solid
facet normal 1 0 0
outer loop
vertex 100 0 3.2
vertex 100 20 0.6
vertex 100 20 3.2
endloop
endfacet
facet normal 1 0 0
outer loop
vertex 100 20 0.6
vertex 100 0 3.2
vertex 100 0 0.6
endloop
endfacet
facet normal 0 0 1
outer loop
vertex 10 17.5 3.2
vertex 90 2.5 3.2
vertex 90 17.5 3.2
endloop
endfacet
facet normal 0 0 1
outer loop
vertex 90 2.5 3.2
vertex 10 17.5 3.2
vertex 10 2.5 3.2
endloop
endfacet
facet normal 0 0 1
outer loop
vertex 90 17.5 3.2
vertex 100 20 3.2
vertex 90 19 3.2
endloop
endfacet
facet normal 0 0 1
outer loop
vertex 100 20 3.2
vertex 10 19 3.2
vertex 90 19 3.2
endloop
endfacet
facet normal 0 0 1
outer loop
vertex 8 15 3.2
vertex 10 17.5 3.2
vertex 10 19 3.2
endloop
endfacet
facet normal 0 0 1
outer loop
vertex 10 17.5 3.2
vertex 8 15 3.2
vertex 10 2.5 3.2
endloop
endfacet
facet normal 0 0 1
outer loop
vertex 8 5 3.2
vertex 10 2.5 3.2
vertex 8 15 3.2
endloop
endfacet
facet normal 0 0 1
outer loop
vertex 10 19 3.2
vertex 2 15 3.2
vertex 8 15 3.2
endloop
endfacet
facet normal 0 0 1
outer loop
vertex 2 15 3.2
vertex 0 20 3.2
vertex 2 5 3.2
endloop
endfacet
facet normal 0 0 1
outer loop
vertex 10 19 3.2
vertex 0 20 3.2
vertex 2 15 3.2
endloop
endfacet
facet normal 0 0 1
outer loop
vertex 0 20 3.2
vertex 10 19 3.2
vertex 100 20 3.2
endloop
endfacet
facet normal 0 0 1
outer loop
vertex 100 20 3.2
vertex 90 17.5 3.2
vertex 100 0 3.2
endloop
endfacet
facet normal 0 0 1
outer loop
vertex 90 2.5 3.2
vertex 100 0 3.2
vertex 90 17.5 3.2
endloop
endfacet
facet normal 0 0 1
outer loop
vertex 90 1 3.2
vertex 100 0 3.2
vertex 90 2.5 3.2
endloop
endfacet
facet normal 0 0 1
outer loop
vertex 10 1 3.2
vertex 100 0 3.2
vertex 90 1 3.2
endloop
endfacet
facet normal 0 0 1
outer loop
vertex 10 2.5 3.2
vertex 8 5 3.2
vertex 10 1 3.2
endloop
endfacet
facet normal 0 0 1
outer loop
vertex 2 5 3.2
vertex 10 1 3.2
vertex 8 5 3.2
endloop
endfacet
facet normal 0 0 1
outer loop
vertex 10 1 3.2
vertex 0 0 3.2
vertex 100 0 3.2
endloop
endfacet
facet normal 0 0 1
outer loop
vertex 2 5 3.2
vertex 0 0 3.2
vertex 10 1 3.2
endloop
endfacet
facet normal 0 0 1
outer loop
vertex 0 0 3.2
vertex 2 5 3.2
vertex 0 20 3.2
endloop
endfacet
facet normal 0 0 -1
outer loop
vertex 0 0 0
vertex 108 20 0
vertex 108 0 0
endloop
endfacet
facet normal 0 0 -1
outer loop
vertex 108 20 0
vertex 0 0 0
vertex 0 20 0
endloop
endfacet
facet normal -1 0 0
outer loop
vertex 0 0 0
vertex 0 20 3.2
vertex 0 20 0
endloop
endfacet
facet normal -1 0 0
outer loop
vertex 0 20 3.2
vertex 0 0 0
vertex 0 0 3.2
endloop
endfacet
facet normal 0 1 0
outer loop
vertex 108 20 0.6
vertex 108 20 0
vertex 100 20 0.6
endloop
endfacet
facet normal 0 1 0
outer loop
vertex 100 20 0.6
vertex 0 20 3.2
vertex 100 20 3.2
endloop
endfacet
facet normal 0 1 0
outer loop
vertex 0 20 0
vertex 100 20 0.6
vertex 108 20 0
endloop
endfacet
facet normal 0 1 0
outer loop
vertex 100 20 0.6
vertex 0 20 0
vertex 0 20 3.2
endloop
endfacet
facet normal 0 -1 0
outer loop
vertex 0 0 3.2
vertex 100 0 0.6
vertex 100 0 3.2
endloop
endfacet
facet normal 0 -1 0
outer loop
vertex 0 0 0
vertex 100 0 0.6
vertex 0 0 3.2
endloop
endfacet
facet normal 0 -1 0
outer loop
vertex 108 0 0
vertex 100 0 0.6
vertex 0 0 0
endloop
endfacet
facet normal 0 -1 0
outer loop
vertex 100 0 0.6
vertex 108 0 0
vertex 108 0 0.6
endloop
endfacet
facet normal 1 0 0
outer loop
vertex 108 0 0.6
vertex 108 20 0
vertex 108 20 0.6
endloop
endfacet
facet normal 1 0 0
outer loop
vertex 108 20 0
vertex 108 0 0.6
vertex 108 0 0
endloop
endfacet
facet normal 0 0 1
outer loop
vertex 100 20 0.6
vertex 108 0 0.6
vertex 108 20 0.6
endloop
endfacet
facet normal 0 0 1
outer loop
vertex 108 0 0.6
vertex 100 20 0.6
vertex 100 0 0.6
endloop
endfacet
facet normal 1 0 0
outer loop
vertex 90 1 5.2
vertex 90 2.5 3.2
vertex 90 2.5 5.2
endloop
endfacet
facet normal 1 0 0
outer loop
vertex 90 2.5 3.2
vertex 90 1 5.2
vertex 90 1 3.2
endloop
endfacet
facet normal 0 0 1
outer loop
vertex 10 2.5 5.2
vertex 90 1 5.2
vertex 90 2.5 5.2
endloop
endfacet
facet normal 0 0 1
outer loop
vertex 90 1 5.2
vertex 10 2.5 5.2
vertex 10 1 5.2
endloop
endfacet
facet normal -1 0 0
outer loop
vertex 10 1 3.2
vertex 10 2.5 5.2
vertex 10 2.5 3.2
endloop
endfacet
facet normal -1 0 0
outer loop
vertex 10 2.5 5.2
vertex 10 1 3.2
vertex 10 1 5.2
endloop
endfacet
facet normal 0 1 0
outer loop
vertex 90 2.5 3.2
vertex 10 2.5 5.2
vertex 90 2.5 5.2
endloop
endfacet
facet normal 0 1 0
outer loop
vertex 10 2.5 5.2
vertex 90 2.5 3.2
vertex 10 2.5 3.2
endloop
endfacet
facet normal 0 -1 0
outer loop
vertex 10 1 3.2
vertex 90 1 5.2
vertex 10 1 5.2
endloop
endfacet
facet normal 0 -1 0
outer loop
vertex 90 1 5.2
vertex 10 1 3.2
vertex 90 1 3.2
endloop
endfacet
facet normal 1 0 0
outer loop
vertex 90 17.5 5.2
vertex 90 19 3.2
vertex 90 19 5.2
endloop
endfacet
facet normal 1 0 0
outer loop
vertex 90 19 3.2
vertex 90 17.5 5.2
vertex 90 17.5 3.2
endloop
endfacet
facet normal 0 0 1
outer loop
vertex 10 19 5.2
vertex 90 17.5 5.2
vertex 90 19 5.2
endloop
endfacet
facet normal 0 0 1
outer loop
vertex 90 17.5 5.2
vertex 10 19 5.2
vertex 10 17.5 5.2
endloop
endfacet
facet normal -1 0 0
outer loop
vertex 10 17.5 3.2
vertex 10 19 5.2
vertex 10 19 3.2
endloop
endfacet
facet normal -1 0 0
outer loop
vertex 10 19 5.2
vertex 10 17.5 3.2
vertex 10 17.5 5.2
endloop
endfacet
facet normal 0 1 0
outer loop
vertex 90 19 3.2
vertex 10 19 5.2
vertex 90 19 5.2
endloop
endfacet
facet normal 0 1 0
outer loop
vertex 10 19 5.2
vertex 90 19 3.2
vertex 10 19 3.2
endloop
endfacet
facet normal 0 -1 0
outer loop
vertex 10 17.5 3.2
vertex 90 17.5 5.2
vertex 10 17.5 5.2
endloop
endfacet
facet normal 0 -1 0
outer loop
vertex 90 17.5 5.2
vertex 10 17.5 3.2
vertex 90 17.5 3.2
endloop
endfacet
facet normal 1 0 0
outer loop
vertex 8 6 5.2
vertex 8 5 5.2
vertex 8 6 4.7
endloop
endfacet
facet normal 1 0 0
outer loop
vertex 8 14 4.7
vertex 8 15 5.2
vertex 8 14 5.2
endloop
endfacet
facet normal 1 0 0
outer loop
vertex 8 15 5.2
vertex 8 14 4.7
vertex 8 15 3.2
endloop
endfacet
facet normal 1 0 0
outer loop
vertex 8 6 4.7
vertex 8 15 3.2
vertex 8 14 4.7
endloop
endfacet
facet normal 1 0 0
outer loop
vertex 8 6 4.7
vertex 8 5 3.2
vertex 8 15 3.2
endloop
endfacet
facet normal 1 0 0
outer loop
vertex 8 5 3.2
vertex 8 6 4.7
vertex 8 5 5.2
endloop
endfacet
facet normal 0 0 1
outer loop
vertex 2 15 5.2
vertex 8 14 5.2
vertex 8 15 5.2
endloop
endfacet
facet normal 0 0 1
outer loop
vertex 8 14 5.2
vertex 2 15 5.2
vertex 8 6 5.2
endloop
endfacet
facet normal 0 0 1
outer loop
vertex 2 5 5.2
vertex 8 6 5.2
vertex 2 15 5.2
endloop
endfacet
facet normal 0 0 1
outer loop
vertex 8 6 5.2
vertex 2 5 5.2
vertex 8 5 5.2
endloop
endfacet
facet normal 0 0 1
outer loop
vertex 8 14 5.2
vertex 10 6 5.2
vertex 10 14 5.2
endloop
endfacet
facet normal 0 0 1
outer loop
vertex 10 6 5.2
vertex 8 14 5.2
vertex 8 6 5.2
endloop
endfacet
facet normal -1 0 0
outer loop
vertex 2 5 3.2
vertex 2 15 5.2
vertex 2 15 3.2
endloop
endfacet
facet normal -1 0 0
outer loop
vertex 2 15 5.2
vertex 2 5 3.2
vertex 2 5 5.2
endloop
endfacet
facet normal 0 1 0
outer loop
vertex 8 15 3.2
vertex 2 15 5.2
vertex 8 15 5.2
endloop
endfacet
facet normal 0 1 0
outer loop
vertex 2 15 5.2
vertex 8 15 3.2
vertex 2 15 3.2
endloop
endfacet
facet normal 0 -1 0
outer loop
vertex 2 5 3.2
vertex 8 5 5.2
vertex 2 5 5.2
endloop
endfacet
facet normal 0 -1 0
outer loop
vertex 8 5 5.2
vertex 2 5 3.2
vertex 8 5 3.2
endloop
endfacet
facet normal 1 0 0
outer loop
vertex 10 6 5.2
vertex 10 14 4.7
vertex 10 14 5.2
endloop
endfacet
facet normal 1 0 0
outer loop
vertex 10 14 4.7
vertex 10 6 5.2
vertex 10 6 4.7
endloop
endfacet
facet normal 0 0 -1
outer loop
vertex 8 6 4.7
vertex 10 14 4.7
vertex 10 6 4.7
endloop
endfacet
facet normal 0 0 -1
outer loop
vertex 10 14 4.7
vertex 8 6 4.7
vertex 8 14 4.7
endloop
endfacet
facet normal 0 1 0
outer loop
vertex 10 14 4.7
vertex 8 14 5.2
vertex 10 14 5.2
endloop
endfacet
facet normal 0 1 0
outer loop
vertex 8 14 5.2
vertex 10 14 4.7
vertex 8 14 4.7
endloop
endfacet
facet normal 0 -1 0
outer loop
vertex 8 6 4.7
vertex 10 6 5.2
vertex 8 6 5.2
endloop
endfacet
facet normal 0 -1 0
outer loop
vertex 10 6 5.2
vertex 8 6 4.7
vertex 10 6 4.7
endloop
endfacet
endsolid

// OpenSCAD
// Bag clip with living hinge - PETG, 0.4mm nozzle, no supports
// One piece, printed open flat. Lower arm + upper arm meet at hinge mid-plane.
// Fold map (180 about pivot): F(x) = 216 - x, F(z) = 10.4 - z.

part = "arm_lower"; // [arm_lower, arm_upper, assembly]
cadverify_only = "";

Lbody = 100;
Wbody = 20;
Tbody = 3.2;
Hhalf = 8;
Thinge = 0.6;
Bgap = 2.0;
Xpiv = 108;
Zpiv = 5.2;

module instance(name, part, unit = 1) {
    echo(cadverify_instance = [name, part, unit]);
    if (cadverify_only == "" || cadverify_only == name) children();
}

module arm_lower() {
    cube([Lbody, Wbody, Tbody], false);
    translate([Lbody-0.1, 0, 0])
        cube([Hhalf+0.1, Wbody, Thinge], false);
    translate([10, 1, Tbody-0.1])
        cube([80, 1.5, Bgap+0.1], false);
    translate([10, 17.5, Tbody-0.1])
        cube([80, 1.5, Bgap+0.1], false);
    translate([2, 5, Tbody-0.1])
        cube([6, 10, Bgap+0.1], false);
    translate([7.9, 6, 4.7])
        cube([2.1, 8, 0.5], false);
}

module arm_upper() {
    cube([Hhalf+0.1, Wbody, Thinge], false);
    translate([Hhalf-0.1, 0, 0])
        cube([Lbody+0.1, Wbody, Tbody], false);
    translate([100, 5, Tbody-0.1])
        cube([6, 10, Bgap+0.1], false);
    translate([97.9, 6, 4.6])
        cube([2.5, 8, 0.5], false);
    translate([107.9, 6, 0])
        cube([8.1, 8, Tbody], false);
}

if (part == "arm_lower") {
    echo(cadverify_spec = [
        ["bounds", [[0, 0, 0], [108, 20, 5.2]]],
        ["bodies", 1],
        ["through_holes", 0],
        ["support_faces", [["bed", "-z", 1500]]],
        ["overhangs_allowed", [["latch lip", [[7.5, 5.5, 4.5], [10.5, 14.5, 5.5]]]]],
        ["copies", 1],
        ["details", [
            ["arm", "material", [[20, 6, 1.0], [80, 14, 2.2]], 1],
            ["arm_wall", "thickness", [50, 10, 10], [0, 0, -1], 3.2],
            ["hinge", "thickness", [104, 10, 5], [0, 0, -1], 0.6],
            ["rib", "material", [[20, 1.2, 3.5], [80, 2.3, 5.0]], 1],
            ["latch_tower", "material", [[3, 6, 3.5], [7, 14, 5.0]], 1],
            ["latch_lip", "material", [[8.2, 7, 4.8], [9.7, 13, 5.1]], 1],
            ["bag_slot", "void", [[20, 3, 3.5], [80, 17, 5.0]], 1]
        ]]
    ]);
    arm_lower();
} else if (part == "arm_upper") {
    echo(cadverify_spec = [
        ["bounds", [[0, 0, 0], [116, 20, 5.2]]],
        ["bodies", 1],
        ["through_holes", 0],
        ["support_faces", [["bed", "-z", 1500]]],
        ["overhangs_allowed", [["latch lip", [[97.5, 5.5, 4.5], [100.8, 14.5, 5.5]]]]],
        ["copies", 1],
        ["details", [
            ["arm", "material", [[15, 6, 1.0], [80, 14, 2.2]], 0.99],
            ["arm_wall", "thickness", [50, 10, 10], [0, 0, -1], 3.2],
            ["hinge", "thickness", [4, 10, 5], [0, 0, -1], 0.6],
            ["latch_tower", "material", [[100.5, 6, 3.5], [105.5, 14, 5.0]], 1],
            ["latch_lip", "material", [[98.2, 7, 4.8], [100.1, 13, 5.1]], 1],
            ["thumb_tab", "material", [[108.5, 7, 1.0], [115, 13, 2.2]], 1],
            ["field", "void", [[15, 3, 3.5], [80, 17, 5.0]], 1]
        ]]
    ]);
    arm_upper();
} else if (part == "assembly") {
    echo(cadverify_spec = [
        ["bounds", [[0, 0, 0], [224, 20, 5.2]]],
        ["support_faces", [["bed", "-z", 3000]]],
        ["motions", [
            ["close", ["upper"], "rotate", [108, 10, 5.2], [0, -1, 0], [0, 180],
                ["flex", [["upper", "lower", 1.0, "latch snap"]]],
                ["stops", [180]]
            ]
        ]],
        ["assembly_order", [
            [["lower"], [0, 0, 0]],
            [["upper"], [0, 0, -1]]
        ]]
    ]);
    instance("lower", "arm_lower") arm_lower();
    instance("upper", "arm_upper") translate([108, 0, 0]) arm_upper();
}
